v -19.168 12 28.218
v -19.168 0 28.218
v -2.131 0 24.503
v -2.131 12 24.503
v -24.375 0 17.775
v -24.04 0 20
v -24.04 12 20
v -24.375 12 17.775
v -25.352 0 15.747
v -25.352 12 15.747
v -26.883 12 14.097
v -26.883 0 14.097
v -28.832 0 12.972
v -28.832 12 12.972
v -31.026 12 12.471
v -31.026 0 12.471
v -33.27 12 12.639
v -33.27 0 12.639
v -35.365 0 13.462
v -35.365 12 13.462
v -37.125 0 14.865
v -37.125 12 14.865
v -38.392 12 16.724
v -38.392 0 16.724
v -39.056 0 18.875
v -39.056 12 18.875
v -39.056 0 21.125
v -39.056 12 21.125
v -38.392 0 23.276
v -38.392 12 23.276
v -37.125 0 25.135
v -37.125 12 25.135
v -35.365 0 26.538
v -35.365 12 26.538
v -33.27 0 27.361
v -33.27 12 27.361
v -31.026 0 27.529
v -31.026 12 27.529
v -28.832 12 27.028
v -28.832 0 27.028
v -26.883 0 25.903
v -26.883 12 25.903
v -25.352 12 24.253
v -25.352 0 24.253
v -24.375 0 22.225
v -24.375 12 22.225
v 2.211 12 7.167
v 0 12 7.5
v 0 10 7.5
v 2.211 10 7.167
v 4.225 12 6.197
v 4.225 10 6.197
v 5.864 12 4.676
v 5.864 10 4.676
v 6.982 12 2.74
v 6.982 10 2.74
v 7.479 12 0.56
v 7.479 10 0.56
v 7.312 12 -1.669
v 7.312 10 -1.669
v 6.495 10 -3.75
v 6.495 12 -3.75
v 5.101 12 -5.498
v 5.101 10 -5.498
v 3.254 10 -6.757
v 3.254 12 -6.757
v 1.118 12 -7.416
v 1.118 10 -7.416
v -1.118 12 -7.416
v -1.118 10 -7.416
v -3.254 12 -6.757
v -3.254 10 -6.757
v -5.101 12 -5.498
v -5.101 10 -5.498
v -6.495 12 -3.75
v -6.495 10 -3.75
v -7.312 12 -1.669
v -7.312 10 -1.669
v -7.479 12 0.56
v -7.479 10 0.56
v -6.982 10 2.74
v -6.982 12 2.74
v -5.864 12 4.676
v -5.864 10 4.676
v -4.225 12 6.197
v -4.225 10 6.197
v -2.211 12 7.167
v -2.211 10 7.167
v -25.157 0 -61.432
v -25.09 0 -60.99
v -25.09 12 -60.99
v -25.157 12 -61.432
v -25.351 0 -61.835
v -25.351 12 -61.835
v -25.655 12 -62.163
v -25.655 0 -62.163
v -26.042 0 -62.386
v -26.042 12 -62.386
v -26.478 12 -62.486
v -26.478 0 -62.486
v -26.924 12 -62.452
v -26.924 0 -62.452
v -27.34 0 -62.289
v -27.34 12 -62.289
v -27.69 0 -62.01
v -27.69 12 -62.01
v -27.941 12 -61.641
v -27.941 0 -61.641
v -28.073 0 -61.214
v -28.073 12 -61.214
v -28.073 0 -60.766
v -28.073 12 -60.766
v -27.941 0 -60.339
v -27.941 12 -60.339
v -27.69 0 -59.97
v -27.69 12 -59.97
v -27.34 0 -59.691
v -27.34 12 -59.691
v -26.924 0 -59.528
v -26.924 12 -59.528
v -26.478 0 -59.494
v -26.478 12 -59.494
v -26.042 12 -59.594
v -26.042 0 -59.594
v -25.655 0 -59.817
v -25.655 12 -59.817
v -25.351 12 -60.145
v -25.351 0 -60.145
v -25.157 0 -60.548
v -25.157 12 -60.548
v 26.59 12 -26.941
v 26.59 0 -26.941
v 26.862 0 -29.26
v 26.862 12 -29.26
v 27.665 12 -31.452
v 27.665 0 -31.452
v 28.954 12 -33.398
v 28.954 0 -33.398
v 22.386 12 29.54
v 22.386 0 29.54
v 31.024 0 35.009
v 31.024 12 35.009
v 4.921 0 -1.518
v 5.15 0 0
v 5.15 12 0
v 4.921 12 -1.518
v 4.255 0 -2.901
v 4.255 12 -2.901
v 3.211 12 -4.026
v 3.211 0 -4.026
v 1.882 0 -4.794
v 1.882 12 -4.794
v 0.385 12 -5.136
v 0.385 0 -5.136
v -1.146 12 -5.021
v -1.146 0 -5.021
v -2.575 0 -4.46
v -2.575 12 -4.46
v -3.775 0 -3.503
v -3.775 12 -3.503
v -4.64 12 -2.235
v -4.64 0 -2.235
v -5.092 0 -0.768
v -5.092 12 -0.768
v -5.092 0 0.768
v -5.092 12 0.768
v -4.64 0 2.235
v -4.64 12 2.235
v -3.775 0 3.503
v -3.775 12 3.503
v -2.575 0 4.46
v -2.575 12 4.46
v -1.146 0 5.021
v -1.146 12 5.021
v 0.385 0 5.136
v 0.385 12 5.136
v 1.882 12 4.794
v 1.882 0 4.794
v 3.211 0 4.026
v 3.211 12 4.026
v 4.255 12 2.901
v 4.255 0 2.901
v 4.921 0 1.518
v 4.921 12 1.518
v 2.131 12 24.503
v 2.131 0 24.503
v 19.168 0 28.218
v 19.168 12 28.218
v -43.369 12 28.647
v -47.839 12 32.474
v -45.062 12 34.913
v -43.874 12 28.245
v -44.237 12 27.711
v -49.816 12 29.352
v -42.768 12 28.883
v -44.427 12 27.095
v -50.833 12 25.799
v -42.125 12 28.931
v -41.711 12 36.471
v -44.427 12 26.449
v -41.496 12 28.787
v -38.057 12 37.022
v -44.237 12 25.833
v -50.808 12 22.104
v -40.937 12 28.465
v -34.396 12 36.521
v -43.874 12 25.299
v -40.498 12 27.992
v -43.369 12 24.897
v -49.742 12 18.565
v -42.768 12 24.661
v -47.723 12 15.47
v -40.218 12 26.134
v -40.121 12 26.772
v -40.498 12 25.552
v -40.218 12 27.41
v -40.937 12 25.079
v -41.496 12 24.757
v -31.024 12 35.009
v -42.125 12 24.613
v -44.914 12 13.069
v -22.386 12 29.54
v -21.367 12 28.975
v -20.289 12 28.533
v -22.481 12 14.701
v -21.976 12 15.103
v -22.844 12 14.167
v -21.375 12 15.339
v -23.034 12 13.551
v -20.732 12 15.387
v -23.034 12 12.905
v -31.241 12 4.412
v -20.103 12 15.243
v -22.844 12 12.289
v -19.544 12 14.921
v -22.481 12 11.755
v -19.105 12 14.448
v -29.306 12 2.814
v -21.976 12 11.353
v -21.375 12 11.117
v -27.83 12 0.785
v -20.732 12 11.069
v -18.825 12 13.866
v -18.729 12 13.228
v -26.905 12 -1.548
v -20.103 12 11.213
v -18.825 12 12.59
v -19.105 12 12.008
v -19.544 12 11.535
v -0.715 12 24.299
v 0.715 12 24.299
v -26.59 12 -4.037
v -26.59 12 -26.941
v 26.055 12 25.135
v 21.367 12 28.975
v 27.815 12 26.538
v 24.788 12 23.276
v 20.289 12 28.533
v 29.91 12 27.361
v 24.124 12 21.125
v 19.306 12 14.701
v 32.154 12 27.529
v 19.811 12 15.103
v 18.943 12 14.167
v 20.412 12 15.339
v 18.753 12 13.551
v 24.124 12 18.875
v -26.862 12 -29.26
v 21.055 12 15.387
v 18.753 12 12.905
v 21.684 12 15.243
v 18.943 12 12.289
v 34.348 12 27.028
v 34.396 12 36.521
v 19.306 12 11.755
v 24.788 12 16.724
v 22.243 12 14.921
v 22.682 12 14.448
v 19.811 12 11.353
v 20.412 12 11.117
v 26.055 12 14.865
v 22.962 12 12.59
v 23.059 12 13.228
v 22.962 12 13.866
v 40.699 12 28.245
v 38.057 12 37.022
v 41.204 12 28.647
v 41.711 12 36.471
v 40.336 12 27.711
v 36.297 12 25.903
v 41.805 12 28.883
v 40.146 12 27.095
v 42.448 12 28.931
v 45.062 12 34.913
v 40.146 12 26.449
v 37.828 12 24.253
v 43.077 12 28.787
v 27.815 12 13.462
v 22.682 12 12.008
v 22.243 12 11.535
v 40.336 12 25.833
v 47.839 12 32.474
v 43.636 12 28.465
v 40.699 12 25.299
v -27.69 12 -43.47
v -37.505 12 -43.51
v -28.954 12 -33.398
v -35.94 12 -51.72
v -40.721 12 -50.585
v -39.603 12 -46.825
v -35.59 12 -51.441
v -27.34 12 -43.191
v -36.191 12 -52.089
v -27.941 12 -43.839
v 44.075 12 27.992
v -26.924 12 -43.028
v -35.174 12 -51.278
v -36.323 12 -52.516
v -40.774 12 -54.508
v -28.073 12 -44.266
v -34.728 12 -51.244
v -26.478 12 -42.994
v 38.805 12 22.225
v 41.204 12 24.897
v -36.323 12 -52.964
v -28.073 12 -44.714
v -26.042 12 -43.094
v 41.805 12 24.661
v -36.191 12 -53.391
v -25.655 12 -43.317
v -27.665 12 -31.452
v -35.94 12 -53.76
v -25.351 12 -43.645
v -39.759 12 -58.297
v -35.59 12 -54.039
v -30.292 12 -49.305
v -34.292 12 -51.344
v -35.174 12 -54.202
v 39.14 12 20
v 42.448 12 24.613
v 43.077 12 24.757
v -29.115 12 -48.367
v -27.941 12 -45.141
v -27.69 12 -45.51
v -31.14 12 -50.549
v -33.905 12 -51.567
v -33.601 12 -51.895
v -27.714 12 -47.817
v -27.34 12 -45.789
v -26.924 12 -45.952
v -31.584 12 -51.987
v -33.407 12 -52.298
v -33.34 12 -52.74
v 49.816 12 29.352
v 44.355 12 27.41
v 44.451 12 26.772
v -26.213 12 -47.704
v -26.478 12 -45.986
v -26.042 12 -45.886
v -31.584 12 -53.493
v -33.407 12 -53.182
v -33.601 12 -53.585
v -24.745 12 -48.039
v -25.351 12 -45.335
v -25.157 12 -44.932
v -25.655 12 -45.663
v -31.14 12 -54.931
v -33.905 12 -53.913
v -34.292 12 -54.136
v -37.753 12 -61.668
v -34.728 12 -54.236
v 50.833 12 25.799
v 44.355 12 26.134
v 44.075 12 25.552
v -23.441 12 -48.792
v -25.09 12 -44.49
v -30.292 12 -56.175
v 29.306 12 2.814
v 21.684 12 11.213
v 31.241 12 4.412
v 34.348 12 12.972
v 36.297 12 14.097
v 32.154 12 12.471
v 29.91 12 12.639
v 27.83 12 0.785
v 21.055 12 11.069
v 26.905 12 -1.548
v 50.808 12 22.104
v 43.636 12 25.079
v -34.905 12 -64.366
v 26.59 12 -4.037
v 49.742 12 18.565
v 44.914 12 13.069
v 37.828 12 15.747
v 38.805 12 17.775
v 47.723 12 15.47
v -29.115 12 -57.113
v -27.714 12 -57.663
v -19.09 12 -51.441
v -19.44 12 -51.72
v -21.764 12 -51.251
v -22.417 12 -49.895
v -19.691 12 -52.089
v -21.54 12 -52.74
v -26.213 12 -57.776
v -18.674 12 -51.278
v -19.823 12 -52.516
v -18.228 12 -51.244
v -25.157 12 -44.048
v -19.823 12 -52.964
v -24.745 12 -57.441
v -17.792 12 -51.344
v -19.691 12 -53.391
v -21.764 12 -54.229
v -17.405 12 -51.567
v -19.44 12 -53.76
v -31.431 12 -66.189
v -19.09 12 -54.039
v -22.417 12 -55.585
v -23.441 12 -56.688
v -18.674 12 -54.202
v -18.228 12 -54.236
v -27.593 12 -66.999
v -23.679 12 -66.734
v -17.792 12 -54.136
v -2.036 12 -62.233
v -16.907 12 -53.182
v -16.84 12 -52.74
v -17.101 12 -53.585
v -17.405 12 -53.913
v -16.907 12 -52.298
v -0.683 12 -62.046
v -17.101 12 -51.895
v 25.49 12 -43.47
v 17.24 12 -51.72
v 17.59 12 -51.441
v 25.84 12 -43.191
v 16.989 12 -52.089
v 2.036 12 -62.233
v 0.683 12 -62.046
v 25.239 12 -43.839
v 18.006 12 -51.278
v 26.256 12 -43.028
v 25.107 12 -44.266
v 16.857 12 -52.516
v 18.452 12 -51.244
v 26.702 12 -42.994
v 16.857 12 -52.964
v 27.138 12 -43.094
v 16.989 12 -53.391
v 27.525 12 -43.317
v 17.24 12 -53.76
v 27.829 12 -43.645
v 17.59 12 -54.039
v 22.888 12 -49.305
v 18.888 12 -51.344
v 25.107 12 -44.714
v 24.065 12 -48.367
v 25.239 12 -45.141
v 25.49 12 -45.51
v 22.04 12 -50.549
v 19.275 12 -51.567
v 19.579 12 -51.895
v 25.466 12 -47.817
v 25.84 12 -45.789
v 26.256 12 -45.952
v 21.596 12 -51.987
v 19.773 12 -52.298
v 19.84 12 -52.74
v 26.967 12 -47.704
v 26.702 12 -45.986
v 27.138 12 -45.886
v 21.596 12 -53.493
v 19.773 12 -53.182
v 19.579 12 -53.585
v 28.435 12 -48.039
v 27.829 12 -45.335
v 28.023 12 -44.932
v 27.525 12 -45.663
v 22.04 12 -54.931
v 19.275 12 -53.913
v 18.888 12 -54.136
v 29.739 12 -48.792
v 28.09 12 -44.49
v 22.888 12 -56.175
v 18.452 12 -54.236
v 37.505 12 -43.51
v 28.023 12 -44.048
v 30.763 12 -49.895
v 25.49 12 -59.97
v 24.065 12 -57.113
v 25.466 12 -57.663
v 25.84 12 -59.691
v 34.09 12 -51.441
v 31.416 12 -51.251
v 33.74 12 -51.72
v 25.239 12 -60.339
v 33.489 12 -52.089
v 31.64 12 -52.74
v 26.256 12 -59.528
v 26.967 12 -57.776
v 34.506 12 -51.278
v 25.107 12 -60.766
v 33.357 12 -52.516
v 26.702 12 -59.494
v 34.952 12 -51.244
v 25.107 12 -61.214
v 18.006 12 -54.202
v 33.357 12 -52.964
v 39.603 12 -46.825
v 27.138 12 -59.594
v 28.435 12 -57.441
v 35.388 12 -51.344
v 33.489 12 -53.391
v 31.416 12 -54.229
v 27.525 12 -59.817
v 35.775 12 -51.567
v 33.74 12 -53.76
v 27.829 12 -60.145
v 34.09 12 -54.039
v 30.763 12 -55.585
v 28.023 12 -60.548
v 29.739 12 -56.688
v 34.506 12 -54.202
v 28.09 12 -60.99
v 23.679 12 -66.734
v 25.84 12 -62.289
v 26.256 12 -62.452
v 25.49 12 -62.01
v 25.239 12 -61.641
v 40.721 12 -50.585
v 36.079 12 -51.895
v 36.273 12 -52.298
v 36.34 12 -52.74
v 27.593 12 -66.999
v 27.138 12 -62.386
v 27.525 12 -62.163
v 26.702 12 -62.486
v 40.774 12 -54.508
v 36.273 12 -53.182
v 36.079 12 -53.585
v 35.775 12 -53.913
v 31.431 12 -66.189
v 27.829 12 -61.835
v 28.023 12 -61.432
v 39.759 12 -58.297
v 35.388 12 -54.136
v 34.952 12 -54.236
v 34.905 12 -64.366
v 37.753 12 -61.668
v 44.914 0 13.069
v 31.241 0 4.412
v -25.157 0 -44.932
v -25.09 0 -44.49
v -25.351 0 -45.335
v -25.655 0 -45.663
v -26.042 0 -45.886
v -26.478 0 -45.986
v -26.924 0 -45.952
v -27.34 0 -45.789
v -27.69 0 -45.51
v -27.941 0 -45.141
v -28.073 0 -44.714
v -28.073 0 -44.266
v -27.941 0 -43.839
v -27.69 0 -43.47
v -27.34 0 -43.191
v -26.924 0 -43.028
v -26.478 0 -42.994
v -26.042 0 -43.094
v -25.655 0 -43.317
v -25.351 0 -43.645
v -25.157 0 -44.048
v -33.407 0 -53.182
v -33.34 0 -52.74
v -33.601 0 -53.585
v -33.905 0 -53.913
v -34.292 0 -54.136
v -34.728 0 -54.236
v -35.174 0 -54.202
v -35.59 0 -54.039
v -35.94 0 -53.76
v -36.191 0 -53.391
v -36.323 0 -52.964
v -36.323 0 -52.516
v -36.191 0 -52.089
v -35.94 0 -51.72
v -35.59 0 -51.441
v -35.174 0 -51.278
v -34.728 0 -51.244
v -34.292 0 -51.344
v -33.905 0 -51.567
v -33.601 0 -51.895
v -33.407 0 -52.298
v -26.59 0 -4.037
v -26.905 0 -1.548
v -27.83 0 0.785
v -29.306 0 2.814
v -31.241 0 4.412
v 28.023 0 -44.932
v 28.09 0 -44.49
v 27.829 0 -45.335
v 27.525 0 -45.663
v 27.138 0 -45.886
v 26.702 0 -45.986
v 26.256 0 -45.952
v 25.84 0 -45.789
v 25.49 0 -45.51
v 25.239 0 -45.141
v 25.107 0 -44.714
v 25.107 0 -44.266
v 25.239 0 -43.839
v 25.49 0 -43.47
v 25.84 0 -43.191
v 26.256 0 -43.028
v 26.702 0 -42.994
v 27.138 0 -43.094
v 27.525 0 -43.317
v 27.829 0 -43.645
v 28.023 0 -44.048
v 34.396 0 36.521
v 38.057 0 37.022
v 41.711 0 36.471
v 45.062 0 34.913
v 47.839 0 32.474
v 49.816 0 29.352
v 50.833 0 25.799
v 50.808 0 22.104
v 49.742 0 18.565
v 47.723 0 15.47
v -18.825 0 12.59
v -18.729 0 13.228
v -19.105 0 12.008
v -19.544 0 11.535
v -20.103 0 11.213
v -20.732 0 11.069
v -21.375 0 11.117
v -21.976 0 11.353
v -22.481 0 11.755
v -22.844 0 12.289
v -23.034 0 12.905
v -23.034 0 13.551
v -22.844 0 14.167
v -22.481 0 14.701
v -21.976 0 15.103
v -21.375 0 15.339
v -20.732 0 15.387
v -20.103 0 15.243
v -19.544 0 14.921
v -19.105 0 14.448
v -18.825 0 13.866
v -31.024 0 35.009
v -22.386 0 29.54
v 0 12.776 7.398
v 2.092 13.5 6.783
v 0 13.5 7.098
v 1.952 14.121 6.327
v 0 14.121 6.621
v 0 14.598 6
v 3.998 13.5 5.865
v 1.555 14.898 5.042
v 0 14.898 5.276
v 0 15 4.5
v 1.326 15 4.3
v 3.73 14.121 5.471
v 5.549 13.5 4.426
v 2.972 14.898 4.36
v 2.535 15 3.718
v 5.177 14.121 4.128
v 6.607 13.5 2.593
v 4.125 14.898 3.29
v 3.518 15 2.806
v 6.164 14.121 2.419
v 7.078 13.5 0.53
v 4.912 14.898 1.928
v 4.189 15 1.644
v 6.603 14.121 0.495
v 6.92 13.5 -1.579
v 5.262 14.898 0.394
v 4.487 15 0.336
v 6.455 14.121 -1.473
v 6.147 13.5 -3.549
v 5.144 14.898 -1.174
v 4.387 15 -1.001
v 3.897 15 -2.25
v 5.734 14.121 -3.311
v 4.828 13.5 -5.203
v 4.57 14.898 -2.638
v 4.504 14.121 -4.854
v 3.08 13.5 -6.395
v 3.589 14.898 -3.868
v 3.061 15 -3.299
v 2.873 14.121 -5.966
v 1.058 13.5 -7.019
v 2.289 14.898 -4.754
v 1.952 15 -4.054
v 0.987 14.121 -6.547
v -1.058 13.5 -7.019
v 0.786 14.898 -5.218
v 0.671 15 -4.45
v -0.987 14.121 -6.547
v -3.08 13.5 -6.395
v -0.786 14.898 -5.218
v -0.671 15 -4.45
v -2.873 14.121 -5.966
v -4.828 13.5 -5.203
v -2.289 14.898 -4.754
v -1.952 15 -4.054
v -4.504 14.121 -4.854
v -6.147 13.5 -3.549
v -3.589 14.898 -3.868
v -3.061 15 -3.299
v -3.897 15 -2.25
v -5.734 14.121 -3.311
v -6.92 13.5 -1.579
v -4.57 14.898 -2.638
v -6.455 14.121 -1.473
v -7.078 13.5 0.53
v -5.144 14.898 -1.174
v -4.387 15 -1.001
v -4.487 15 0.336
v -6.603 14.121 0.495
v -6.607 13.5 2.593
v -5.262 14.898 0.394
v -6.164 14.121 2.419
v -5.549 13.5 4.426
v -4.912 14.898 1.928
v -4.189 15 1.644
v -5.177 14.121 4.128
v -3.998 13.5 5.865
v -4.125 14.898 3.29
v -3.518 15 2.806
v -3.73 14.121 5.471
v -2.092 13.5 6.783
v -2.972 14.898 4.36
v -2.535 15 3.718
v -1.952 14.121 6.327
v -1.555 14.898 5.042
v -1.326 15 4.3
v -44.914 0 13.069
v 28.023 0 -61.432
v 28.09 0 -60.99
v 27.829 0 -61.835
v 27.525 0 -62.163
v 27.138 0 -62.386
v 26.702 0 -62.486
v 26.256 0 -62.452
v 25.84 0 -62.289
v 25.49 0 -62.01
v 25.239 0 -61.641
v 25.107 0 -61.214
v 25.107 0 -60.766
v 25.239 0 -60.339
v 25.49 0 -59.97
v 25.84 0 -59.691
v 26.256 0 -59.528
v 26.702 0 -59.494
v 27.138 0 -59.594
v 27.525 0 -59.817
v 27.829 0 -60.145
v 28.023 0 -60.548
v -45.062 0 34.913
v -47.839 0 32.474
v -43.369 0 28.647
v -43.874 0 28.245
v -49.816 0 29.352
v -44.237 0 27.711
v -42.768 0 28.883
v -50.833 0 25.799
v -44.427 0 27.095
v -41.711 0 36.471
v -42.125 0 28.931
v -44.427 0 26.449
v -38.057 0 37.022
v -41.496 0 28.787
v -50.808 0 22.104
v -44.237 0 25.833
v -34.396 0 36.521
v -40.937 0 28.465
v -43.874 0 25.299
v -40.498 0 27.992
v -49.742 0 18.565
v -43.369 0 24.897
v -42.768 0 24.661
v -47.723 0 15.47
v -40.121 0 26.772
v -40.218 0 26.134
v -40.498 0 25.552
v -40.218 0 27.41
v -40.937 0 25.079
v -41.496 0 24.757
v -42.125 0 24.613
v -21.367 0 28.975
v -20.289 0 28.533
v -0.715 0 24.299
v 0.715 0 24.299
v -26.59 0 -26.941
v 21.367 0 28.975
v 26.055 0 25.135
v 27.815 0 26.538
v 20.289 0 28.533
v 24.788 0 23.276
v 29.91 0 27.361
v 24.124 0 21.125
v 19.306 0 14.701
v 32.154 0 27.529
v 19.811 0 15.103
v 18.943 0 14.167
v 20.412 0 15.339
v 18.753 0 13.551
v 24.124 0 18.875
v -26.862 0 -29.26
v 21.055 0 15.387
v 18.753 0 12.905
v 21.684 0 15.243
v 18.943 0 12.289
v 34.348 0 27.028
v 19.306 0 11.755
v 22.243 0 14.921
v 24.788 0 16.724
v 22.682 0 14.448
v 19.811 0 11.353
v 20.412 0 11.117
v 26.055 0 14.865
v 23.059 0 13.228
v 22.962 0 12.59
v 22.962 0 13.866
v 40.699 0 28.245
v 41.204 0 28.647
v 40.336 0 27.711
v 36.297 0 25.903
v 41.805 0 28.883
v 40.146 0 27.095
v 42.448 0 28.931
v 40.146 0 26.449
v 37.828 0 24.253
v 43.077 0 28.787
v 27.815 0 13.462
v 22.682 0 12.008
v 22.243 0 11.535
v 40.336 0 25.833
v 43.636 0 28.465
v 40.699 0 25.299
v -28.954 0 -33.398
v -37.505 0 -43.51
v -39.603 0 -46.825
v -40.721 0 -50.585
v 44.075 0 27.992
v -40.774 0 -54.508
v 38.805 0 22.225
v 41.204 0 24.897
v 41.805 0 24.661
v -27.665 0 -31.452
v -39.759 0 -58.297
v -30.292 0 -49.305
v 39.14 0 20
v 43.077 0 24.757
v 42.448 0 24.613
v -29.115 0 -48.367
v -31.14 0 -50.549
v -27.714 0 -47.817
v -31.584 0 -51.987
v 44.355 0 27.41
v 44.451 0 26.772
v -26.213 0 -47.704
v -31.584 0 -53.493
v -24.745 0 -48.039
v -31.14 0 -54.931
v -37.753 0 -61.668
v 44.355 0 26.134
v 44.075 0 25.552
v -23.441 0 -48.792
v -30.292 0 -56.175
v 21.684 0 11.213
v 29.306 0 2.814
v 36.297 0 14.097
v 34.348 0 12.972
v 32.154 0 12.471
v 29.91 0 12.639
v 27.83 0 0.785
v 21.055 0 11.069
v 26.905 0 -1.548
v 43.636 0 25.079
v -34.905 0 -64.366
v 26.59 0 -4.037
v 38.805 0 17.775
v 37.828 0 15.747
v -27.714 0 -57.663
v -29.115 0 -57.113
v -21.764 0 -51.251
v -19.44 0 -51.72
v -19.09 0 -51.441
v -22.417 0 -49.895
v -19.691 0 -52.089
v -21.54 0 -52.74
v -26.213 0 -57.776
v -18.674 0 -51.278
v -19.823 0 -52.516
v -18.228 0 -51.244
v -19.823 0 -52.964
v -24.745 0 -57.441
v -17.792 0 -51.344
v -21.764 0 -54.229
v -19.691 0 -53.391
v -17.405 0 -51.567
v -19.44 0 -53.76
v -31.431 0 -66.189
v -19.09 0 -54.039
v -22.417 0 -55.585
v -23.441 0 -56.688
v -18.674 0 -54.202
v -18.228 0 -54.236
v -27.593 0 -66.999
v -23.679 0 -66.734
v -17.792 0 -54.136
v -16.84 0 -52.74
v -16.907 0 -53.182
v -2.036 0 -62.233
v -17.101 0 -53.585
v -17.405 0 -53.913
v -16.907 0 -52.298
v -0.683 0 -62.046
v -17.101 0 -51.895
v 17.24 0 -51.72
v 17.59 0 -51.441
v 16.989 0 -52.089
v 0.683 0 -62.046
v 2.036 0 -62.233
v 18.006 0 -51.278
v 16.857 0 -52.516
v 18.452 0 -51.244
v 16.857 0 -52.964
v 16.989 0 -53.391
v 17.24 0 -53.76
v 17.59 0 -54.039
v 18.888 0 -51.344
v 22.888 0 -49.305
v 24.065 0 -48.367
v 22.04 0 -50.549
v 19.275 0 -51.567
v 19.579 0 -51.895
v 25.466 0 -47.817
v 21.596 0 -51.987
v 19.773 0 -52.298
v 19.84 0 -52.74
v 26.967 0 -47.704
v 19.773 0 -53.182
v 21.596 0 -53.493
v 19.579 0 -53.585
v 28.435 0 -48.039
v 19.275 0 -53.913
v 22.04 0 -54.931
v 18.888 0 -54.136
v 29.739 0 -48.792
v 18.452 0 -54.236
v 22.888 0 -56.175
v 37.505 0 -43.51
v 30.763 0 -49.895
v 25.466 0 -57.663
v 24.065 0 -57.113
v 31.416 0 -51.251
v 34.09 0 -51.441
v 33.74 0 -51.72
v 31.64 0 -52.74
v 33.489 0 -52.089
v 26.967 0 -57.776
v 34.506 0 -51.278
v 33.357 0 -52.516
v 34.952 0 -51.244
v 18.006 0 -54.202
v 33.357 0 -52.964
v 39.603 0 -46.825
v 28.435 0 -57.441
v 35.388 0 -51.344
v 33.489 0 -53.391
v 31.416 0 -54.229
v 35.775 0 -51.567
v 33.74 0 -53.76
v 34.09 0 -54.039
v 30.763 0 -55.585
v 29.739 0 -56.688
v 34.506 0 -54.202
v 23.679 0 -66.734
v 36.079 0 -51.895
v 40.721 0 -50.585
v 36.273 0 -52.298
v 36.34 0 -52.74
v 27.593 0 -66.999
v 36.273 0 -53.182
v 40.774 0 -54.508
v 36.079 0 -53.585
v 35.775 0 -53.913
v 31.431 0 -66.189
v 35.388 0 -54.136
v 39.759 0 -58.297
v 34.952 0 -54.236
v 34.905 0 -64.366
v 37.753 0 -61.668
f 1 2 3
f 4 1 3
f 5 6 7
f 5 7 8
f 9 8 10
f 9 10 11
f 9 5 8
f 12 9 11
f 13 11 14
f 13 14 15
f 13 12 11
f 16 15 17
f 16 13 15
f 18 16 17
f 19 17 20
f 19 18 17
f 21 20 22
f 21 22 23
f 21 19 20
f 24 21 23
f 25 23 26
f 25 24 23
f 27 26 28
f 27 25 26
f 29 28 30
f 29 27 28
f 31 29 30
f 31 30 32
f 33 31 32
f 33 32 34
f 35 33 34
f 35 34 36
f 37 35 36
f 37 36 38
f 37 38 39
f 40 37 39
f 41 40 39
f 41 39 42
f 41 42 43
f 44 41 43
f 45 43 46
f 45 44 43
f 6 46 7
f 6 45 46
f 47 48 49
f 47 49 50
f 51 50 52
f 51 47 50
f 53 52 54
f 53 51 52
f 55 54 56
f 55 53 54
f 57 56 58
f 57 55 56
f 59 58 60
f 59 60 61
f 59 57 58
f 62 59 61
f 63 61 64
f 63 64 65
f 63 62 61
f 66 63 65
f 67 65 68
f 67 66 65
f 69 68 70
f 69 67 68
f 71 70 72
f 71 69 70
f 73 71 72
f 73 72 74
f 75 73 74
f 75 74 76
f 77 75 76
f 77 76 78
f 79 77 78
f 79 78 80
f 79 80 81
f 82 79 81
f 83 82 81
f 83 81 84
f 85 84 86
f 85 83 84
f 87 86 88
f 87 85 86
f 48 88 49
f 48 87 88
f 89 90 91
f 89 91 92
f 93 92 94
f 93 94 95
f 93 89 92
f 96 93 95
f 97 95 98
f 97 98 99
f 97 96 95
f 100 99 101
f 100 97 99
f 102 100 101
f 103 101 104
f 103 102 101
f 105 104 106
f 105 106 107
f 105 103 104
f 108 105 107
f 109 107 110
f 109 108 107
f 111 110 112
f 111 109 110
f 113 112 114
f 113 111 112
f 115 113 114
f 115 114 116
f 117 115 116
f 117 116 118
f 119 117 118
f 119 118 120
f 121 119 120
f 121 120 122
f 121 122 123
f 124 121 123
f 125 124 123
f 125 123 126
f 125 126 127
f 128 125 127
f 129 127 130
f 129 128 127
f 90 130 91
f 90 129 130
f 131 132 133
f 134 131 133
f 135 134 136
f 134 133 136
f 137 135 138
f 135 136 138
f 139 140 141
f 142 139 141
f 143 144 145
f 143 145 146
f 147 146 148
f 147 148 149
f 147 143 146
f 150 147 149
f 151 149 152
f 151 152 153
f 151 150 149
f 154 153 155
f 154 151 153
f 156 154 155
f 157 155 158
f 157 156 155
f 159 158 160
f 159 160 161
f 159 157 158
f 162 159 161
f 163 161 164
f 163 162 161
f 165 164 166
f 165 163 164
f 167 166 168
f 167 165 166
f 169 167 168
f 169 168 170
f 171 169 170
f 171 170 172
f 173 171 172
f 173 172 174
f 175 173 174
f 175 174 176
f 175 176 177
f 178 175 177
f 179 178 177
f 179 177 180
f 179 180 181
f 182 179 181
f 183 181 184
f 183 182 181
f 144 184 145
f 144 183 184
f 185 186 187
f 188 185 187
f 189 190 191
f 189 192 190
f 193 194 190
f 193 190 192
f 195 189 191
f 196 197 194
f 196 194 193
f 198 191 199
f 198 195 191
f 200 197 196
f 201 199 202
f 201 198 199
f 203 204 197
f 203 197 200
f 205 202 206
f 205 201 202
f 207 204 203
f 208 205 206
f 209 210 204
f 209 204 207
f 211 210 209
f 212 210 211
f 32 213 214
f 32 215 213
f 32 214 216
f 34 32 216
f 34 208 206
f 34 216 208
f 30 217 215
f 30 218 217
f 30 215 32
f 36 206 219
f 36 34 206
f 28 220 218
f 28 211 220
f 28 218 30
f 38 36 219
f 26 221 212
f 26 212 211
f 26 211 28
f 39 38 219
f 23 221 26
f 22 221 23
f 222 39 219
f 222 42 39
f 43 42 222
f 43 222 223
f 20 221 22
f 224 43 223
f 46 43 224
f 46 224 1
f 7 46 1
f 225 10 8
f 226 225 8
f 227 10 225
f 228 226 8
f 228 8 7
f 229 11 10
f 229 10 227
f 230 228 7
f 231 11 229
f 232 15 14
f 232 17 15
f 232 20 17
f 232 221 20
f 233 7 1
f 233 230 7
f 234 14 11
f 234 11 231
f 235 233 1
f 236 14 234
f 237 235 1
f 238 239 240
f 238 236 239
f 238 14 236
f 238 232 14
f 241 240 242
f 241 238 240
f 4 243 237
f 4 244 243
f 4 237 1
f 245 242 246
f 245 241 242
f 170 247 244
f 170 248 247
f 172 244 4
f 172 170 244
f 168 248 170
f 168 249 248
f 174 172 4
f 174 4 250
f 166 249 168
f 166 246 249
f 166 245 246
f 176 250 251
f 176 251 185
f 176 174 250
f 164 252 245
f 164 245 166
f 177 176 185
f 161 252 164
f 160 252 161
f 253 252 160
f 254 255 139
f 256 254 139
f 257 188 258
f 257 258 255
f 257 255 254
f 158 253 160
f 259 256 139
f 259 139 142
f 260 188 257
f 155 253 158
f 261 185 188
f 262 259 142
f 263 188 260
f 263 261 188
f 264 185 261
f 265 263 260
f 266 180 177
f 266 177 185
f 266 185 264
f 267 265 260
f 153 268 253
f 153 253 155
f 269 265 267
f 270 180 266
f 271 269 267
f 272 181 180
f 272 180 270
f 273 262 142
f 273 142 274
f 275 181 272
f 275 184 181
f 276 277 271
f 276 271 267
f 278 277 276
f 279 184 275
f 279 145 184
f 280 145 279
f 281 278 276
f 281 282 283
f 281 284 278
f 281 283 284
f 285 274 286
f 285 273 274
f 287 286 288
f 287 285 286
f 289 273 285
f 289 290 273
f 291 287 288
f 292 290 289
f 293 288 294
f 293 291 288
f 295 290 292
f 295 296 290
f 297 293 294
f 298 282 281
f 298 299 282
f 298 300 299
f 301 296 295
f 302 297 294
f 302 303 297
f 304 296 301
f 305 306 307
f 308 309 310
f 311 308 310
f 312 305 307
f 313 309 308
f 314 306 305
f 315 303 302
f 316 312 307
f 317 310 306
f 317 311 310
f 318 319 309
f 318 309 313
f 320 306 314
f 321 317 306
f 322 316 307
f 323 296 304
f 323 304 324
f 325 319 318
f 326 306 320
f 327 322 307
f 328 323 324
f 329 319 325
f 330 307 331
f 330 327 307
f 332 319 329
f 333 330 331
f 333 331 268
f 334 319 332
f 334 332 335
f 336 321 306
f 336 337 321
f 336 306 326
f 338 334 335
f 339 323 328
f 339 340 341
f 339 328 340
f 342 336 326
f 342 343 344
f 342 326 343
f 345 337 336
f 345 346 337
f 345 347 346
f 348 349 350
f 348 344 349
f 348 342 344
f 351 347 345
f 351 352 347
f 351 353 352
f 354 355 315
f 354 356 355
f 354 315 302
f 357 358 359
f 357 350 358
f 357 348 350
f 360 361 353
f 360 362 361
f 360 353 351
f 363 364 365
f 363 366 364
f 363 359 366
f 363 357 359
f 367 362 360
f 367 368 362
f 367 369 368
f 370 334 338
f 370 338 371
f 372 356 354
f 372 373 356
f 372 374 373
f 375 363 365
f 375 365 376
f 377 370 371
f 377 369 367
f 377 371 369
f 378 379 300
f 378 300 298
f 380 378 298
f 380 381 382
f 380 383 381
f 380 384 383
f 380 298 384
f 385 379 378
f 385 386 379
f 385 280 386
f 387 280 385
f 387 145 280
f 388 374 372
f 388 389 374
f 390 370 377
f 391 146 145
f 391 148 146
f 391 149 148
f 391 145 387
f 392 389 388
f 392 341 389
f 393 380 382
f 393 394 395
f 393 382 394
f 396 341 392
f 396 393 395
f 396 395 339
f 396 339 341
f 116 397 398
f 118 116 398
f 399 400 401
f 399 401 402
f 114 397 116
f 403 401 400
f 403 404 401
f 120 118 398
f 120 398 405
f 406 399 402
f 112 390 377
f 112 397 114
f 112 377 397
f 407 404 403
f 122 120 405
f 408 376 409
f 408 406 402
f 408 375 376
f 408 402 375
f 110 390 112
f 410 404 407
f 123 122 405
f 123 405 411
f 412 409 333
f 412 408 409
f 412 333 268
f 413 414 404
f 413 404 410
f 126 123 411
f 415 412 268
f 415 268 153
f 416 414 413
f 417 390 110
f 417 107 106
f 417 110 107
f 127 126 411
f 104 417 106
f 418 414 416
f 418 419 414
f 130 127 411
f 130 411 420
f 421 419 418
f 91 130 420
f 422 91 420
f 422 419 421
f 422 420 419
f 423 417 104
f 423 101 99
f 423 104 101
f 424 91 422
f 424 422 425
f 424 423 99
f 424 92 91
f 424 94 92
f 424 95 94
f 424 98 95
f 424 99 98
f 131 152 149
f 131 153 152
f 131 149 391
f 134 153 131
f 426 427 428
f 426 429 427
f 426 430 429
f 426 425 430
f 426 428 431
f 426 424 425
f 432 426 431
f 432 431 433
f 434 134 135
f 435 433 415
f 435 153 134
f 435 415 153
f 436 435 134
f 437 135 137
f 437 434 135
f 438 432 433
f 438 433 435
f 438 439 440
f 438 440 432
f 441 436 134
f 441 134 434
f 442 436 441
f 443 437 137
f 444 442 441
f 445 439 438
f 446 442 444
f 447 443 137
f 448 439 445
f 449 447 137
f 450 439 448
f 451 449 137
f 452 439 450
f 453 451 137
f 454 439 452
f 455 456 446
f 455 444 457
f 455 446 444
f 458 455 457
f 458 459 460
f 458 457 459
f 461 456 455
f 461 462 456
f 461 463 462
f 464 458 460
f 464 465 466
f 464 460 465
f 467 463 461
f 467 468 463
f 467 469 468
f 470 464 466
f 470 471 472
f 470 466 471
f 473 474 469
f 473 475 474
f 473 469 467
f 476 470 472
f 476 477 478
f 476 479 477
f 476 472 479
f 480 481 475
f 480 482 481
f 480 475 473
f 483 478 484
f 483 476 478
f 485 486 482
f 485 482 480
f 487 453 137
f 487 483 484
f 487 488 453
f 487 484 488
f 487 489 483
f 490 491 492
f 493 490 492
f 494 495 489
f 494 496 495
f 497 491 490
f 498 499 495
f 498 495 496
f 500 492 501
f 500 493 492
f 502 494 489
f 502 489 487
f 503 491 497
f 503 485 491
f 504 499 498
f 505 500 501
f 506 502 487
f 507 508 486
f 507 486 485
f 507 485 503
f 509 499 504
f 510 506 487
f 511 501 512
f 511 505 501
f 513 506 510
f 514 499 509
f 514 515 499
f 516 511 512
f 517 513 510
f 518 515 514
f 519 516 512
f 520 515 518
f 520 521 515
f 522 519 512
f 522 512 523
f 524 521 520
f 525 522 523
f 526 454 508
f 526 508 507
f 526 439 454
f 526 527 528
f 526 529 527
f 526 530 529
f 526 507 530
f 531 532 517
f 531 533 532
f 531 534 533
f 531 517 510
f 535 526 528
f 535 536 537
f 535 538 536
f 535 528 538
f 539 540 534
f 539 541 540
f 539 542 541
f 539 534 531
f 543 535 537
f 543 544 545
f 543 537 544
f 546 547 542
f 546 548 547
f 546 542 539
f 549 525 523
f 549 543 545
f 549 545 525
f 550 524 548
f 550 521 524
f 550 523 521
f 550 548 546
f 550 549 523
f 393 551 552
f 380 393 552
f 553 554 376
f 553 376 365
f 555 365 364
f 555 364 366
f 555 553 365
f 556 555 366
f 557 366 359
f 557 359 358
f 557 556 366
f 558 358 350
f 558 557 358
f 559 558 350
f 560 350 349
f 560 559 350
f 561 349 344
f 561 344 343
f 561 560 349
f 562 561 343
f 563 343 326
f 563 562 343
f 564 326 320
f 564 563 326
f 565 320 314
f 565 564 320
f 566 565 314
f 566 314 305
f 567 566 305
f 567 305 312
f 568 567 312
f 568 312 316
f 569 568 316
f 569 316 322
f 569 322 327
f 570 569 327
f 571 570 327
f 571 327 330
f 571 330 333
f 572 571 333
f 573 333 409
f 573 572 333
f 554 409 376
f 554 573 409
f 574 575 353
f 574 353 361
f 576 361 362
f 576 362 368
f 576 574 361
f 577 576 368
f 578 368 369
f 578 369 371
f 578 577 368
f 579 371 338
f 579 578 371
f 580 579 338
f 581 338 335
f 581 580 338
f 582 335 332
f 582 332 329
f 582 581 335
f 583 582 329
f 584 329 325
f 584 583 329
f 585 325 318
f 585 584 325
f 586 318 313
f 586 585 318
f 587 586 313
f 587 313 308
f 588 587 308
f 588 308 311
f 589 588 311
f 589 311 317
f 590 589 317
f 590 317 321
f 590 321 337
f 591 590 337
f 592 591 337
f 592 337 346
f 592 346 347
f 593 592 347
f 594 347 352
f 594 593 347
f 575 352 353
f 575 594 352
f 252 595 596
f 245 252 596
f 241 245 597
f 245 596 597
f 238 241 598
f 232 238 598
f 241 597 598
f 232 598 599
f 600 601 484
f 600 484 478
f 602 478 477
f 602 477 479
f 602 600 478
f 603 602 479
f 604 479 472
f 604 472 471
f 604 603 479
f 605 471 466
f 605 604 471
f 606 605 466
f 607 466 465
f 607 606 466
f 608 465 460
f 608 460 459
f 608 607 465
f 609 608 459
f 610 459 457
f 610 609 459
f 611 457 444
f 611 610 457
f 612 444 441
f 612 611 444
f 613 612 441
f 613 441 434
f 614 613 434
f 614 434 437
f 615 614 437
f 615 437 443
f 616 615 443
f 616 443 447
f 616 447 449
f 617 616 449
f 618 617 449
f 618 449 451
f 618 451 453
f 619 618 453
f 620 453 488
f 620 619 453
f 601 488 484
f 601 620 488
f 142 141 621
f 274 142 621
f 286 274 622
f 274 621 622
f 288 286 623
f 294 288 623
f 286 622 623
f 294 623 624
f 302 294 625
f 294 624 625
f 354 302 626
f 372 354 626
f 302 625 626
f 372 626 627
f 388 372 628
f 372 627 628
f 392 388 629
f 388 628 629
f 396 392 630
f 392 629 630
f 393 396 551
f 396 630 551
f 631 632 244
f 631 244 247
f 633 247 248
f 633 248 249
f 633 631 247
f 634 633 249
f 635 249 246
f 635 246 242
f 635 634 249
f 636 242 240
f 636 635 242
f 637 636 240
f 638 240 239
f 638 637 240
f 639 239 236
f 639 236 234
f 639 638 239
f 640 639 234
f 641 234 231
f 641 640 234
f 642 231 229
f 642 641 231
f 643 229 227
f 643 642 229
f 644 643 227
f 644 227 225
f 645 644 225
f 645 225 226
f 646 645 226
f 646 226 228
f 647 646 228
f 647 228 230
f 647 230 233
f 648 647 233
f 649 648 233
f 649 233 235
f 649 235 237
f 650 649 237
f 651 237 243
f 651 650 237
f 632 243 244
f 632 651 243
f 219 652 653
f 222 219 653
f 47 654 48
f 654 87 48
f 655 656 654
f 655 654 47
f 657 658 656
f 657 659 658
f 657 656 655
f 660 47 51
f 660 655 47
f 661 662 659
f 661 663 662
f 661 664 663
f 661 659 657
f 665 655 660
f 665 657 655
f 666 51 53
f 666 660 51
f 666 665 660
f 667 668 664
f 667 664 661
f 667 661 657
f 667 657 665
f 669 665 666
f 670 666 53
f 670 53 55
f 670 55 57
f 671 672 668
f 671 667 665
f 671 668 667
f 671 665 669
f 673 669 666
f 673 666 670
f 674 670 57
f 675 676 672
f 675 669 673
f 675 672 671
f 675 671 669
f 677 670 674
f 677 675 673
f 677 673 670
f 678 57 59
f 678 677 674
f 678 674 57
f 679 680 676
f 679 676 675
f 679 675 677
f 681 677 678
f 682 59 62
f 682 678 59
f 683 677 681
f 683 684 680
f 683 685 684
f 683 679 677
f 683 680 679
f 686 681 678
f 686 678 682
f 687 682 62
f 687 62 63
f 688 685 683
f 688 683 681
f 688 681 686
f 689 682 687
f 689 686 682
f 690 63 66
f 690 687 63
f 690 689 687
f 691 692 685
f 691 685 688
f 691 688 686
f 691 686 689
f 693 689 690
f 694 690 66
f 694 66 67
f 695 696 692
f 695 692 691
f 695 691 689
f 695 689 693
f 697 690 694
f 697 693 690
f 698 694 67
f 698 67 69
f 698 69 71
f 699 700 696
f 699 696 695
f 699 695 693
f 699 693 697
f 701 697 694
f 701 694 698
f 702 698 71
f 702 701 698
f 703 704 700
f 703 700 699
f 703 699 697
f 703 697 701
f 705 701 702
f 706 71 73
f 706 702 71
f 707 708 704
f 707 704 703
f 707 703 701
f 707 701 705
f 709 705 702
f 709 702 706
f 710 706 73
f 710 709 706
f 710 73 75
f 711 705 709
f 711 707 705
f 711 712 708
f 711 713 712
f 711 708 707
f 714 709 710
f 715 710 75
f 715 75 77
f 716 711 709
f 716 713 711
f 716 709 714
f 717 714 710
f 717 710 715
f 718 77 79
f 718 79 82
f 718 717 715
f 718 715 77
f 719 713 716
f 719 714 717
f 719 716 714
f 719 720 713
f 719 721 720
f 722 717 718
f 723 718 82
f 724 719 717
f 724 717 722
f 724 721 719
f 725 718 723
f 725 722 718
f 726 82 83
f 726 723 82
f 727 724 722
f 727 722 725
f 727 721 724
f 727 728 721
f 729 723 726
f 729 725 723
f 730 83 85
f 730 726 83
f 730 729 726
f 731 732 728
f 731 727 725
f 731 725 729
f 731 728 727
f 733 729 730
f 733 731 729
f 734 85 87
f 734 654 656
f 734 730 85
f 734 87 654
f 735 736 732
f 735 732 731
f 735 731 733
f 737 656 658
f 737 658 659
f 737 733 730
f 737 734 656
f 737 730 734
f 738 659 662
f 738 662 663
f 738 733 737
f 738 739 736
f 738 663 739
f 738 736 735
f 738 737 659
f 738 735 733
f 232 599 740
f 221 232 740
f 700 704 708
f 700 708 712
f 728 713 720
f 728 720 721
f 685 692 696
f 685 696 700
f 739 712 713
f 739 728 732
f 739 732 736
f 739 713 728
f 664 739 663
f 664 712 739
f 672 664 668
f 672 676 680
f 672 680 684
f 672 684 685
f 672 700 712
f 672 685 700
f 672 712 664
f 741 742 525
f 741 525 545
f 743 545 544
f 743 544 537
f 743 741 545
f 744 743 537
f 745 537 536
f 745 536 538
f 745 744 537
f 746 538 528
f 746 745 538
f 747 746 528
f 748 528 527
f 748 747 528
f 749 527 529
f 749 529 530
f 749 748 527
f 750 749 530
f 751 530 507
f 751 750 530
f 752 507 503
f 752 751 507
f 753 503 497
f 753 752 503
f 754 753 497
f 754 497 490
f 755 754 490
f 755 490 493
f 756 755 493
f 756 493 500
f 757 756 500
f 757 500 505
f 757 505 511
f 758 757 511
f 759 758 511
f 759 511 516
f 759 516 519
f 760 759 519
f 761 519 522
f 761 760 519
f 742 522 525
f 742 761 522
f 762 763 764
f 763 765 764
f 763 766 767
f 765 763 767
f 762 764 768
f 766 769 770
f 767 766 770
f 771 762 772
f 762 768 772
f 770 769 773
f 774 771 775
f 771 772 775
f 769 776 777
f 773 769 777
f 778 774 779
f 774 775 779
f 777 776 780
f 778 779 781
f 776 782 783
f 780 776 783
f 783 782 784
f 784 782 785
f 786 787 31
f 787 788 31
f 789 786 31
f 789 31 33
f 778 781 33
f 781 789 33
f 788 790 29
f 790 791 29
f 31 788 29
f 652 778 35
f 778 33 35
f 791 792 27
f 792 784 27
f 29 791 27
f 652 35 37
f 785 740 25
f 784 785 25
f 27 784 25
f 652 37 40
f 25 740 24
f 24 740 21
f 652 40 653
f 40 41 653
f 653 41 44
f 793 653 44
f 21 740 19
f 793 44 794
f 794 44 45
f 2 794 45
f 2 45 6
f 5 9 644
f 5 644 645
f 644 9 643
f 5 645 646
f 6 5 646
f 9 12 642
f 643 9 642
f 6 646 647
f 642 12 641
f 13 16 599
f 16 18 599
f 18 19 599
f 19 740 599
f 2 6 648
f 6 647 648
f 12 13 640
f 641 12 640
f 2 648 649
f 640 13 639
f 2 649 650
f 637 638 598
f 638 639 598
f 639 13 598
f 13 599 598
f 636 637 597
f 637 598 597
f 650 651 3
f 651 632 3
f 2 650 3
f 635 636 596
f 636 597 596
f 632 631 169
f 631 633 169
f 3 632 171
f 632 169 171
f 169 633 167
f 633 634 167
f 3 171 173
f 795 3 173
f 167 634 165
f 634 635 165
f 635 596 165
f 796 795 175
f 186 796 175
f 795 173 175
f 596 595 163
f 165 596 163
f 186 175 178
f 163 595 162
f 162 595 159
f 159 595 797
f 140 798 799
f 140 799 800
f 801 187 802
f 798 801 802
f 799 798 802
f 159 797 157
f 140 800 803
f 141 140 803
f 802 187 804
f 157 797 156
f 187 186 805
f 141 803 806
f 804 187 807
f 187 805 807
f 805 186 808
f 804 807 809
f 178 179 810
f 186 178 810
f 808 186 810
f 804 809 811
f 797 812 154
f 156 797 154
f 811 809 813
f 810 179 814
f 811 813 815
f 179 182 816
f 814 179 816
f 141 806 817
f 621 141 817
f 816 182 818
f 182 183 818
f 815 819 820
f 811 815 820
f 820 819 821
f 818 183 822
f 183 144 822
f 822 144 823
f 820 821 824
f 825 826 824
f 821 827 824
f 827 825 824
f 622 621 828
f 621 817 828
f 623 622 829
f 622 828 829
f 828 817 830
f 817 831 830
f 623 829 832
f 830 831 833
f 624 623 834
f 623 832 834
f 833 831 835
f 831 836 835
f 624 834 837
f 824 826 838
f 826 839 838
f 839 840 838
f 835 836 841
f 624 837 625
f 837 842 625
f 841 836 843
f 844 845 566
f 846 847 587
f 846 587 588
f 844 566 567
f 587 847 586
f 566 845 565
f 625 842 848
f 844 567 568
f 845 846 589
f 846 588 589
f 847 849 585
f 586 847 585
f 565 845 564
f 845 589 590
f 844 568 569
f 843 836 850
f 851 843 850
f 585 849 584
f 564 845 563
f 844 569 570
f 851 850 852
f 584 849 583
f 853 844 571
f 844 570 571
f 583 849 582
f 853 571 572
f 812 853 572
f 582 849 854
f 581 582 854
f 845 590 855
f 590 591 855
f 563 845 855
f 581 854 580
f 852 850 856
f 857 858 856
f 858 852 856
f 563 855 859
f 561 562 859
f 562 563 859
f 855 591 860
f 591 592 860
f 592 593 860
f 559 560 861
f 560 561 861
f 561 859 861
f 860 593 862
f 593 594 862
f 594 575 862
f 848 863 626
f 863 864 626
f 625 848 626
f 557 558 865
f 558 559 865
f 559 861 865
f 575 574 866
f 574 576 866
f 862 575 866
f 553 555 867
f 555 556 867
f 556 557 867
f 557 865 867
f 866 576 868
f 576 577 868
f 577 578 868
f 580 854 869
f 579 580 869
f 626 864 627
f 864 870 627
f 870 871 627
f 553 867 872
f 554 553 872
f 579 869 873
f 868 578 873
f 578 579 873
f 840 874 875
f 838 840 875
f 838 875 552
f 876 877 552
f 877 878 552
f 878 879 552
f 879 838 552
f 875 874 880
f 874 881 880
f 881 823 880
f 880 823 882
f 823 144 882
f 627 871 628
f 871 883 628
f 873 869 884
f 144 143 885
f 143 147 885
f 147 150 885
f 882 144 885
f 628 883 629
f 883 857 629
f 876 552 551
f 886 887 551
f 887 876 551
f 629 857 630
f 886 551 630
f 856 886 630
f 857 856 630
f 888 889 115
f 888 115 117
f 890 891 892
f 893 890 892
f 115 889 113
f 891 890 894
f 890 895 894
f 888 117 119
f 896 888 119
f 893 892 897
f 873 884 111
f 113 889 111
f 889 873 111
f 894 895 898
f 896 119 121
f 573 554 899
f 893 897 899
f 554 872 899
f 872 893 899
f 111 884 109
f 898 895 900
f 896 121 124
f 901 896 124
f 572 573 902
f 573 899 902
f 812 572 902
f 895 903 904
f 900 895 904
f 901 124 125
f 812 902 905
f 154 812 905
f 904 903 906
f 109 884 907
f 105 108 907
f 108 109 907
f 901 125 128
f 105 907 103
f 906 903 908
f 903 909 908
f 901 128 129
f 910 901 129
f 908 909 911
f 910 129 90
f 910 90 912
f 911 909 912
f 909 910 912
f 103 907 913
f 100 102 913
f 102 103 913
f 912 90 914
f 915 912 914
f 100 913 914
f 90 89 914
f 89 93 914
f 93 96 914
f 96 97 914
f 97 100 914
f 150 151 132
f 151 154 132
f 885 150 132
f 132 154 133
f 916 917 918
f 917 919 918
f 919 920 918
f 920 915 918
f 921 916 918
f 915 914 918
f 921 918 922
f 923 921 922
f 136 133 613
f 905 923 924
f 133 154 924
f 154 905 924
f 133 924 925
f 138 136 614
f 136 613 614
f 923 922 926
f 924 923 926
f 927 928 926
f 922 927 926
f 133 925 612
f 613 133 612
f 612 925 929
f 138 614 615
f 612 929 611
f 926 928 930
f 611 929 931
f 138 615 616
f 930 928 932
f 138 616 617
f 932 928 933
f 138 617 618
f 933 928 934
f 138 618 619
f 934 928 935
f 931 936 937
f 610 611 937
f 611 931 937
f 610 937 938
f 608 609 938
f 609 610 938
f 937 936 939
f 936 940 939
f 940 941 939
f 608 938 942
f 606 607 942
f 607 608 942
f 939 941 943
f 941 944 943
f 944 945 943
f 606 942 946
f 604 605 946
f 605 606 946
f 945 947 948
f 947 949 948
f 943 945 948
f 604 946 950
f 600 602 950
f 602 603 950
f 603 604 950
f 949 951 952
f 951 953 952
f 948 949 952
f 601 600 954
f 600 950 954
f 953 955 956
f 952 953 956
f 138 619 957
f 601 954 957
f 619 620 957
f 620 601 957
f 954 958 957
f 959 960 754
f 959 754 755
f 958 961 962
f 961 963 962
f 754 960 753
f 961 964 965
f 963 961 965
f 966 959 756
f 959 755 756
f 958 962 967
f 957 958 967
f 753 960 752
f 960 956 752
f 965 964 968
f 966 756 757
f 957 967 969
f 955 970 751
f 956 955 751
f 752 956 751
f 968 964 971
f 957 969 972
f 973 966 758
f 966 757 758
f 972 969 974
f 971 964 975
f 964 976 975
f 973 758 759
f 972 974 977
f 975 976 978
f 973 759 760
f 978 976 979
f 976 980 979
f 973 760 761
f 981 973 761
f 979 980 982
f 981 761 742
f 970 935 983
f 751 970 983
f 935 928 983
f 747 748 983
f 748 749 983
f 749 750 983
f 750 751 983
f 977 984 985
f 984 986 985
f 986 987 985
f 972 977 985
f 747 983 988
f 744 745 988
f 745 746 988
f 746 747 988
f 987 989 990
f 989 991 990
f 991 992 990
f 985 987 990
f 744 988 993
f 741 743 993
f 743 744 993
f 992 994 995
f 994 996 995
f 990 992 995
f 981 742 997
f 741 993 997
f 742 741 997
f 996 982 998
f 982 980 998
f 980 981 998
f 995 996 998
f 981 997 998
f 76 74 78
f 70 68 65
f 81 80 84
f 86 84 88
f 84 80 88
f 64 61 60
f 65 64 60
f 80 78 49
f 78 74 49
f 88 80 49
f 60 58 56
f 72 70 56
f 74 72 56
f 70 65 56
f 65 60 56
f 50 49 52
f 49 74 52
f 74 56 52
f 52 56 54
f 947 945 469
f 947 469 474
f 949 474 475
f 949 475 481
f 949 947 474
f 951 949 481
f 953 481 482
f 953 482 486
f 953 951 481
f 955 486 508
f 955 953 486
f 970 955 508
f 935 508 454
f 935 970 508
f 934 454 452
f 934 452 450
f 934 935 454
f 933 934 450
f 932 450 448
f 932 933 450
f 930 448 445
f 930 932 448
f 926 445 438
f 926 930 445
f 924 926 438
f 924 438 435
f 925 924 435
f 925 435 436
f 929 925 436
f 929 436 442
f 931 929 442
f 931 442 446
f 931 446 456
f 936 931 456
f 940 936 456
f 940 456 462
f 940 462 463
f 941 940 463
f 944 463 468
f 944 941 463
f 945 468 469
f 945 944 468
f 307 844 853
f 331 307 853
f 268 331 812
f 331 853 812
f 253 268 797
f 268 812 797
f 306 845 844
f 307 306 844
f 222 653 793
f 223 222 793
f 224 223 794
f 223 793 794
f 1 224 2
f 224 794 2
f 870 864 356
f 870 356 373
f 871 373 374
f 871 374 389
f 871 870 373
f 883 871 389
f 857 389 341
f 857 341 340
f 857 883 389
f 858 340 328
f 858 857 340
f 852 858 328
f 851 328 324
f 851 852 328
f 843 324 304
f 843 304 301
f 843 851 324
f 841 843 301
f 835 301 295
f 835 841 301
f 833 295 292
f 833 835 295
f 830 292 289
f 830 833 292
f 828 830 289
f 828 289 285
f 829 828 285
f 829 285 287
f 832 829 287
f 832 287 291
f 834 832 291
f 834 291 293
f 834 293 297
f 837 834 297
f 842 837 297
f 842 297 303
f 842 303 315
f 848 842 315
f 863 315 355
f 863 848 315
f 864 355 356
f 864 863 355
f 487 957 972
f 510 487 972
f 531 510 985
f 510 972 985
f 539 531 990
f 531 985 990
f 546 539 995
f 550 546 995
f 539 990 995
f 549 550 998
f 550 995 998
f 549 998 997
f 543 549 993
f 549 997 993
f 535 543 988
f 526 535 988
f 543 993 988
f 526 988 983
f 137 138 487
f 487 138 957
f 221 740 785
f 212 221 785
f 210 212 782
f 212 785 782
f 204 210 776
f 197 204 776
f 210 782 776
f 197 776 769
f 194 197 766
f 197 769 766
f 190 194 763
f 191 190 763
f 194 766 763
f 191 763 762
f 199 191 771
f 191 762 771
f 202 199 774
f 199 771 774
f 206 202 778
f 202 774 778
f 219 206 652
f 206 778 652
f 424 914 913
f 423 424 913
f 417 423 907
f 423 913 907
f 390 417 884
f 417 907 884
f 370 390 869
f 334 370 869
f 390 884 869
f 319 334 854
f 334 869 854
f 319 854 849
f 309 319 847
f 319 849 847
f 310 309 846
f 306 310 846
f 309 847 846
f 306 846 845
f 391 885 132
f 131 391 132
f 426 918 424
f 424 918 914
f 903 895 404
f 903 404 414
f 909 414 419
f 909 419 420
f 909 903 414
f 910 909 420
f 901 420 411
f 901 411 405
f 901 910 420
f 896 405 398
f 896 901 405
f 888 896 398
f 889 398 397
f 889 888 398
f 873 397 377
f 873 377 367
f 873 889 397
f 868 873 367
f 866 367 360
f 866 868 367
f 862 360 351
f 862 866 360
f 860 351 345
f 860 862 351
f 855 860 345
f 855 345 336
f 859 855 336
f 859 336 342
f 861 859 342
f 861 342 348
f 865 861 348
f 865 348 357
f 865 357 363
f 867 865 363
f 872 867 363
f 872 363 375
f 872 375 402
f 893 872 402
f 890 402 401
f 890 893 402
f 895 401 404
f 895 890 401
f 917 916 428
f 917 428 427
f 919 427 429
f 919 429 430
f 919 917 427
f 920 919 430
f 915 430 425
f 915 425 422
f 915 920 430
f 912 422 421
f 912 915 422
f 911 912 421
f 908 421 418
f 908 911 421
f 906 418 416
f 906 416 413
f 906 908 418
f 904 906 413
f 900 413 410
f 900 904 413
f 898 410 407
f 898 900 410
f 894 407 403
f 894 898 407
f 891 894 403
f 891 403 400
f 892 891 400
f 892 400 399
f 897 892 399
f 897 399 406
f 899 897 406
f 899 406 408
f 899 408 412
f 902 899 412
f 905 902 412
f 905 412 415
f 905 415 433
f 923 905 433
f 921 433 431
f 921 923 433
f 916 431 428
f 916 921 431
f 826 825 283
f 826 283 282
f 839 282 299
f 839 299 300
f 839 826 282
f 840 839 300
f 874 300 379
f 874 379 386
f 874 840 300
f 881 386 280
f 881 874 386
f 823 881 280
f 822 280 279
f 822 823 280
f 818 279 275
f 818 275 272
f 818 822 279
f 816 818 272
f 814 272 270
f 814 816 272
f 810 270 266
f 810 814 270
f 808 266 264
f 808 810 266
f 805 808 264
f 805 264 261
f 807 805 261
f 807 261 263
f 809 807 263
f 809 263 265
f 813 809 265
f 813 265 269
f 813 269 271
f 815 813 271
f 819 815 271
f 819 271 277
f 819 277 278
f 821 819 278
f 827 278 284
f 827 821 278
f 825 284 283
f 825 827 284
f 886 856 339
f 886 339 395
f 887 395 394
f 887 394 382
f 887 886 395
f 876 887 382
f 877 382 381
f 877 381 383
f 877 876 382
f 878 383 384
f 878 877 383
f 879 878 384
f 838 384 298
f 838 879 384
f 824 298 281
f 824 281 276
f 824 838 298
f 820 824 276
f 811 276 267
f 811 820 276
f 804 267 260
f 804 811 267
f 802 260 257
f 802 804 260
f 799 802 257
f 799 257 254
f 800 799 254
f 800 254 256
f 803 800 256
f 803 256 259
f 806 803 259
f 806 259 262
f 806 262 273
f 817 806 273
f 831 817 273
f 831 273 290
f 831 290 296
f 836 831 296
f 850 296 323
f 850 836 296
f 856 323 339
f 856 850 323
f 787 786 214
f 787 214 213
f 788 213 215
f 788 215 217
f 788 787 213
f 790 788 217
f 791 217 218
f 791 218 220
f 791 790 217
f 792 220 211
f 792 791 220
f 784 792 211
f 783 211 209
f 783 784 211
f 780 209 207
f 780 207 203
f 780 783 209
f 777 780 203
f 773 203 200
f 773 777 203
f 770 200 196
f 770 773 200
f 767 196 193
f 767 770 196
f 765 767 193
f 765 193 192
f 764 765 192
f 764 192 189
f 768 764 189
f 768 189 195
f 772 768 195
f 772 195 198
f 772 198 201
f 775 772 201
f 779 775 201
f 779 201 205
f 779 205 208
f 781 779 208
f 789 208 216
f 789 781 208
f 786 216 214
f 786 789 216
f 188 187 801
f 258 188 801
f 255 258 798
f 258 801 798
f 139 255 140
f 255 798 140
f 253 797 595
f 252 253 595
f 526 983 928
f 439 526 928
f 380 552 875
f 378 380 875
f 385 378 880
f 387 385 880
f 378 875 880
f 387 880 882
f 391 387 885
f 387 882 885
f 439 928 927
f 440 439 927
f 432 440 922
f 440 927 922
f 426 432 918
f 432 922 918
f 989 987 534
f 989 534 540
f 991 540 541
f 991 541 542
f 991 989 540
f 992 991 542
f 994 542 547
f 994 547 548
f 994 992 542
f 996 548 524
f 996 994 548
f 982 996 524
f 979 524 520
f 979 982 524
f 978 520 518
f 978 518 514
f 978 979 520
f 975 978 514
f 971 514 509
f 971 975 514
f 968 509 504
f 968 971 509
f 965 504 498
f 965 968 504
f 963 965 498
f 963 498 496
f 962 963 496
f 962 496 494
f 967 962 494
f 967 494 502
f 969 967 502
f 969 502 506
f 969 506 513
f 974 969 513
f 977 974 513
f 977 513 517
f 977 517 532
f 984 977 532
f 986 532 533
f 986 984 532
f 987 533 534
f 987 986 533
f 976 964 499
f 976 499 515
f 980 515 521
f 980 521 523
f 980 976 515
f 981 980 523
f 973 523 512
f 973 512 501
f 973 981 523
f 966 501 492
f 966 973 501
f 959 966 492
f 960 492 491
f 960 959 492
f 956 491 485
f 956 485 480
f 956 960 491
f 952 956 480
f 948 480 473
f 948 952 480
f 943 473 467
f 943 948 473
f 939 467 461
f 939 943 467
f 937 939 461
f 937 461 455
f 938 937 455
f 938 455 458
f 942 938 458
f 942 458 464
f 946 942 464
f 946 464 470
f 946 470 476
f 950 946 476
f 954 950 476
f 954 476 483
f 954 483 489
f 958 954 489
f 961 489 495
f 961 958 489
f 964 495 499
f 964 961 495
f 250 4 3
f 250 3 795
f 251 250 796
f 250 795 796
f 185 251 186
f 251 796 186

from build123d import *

# Parameters (mm, degrees)
SKETCH1_R           = 5.15
SKETCH1_R_2         = 7.55
SKETCH1_R_3         = 5.05
SKETCH1_R_4         = 1.5
SKETCH1_R_5         = 2.165
BOSS_EXTRUDE1_DEPTH = 12
SKETCH2_ONE_SIDE_W  = 7.5
SKETCH2_ONE_SIDE_H  = 5
FILLET1_R           = 3


with BuildPart() as part:
    # Sketch1 → Boss-Extrude1 (new body)
    with BuildSketch(Plane(origin=(0, 0, 0), x_dir=(1, 0, 0), z_dir=(0, 1, 0))):
        with BuildLine():
            Line((-2.036490016, 62.232628927), (-23.679041405, 66.734453302))
            ThreePointArc((-23.679041405, 66.734453302), (-38.872266056, 60.051931597), (-37.504850395, 43.510458082))
            Line((-37.504850395, 43.510458082), (-28.95403297, 33.398266841))
            ThreePointArc((-28.95403297, 33.398266841), (-27.199588127, 30.379378664), (-26.59, 26.941332001))
            Line((-26.59, 26.941332001), (-26.59, 4.037047599))
            ThreePointArc((-26.59, 4.037047599), (-27.829524982, -0.785200575), (-31.240815491, -4.411989333))
            Line((-31.240815491, -4.411989333), (-44.914180747, -13.06875746))
            ThreePointArc((-44.914180747, -13.06875746), (-48.938899729, -30.983792167), (-31.023865021, -35.008511149))
            Line((-31.023865021, -35.008511149), (-22.386088755, -29.539833551))
            ThreePointArc((-22.386088755, -29.539833551), (-20.83471499, -28.738106539), (-19.167525971, -28.21848405))
            Line((-19.167525971, -28.21848405), (-2.130621725, -24.503257579))
            ThreePointArc((-2.130621725, -24.503257579), (0, -24.273644012), (2.130621725, -24.503257579))
            Line((2.130621725, -24.503257579), (19.167525971, -28.21848405))
            ThreePointArc((19.167525971, -28.21848405), (20.83471499, -28.738106539), (22.386088755, -29.539833551))
            Line((22.386088755, -29.539833551), (31.023865021, -35.008511149))
            ThreePointArc((31.023865021, -35.008511149), (48.938899729, -30.983792167), (44.914180747, -13.06875746))
            Line((44.914180747, -13.06875746), (31.240815491, -4.411989333))
            ThreePointArc((31.240815491, -4.411989333), (27.829524982, -0.785200575), (26.59, 4.037047599))
            Line((26.59, 4.037047599), (26.59, 26.941332001))
            ThreePointArc((26.59, 26.941332001), (27.199588127, 30.379378664), (28.95403297, 33.398266841))
            Line((28.95403297, 33.398266841), (37.504850395, 43.510458082))
            ThreePointArc((37.504850395, 43.510458082), (38.872266056, 60.051931597), (23.679041405, 66.734453302))
            Line((23.679041405, 66.734453302), (2.036490016, 62.232628927))
            ThreePointArc((2.036490016, 62.232628927), (0, 62.023068571), (-2.036490016, 62.232628927))
        make_face()
        Circle(SKETCH1_R, mode=Mode.SUBTRACT)
        with Locations((-31.59, -20)):
            Circle(SKETCH1_R_2, mode=Mode.SUBTRACT)
        with Locations((-26.59, 52.74)):
            Circle(SKETCH1_R_3, mode=Mode.SUBTRACT)
        with Locations((-26.59, 60.99)):
            Circle(SKETCH1_R_4, mode=Mode.SUBTRACT)
        with Locations((-18.34, 52.74)):
            Circle(SKETCH1_R_4, mode=Mode.SUBTRACT)
        with Locations((-26.59, 44.49)):
            Circle(SKETCH1_R_4, mode=Mode.SUBTRACT)
        with Locations((-34.84, 52.74)):
            Circle(SKETCH1_R_4, mode=Mode.SUBTRACT)
        with Locations((-42.286480756, -26.772067589)):
            Circle(SKETCH1_R_5, mode=Mode.SUBTRACT)
        with Locations((-20.893519244, -13.227932411)):
            Circle(SKETCH1_R_5, mode=Mode.SUBTRACT)
        with Locations((20.893519244, -13.227932411)):
            Circle(SKETCH1_R_5, mode=Mode.SUBTRACT)
        with Locations((42.286480756, -26.772067589)):
            Circle(SKETCH1_R_5, mode=Mode.SUBTRACT)
        with Locations((34.84, 52.74)):
            Circle(SKETCH1_R_4, mode=Mode.SUBTRACT)
        with Locations((26.59, 44.49)):
            Circle(SKETCH1_R_4, mode=Mode.SUBTRACT)
        with Locations((18.34, 52.74)):
            Circle(SKETCH1_R_4, mode=Mode.SUBTRACT)
        with Locations((26.59, 60.99)):
            Circle(SKETCH1_R_4, mode=Mode.SUBTRACT)
        with Locations((26.59, 52.74)):
            Circle(SKETCH1_R_3, mode=Mode.SUBTRACT)
        with Locations((31.59, -20)):
            Circle(SKETCH1_R_2, mode=Mode.SUBTRACT)
    extrude(amount=BOSS_EXTRUDE1_DEPTH)


with BuildPart() as body_2:
    # Sketch2 one side → Revolve1 (revolve)
    with BuildSketch(Plane(origin=(0, 0, 0), x_dir=(0, 0, -1), z_dir=(1, 0, 0))):
        with Locations((-3.75, 12.5)):
            Rectangle(SKETCH2_ONE_SIDE_W, SKETCH2_ONE_SIDE_H)
    revolve(axis=Axis((0, 0, 0), (0, 1, 0)))

    # Fillet1
    fillet1_edges = [body_2.edges().sort_by_distance(p)[0] for p in [
        (0, 15, -7.5),
    ]]
    fillet(fillet1_edges, radius=FILLET1_R)


solid = Compound([part.part, body_2.part])
